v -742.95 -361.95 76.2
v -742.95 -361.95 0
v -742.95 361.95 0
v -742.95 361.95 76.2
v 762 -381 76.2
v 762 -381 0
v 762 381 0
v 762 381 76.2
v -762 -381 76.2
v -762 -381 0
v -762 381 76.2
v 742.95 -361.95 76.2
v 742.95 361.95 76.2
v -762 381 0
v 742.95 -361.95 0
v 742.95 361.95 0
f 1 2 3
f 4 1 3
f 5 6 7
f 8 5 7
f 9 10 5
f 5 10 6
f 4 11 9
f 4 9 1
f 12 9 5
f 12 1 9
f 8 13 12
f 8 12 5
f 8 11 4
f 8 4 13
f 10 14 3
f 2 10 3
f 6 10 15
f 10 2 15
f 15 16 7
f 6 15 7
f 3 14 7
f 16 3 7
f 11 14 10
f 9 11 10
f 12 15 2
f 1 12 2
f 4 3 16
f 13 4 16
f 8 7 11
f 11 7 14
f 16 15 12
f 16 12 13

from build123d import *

# Parameters (mm, degrees)
F0_W     = 19.05
F0_H     = 723.9
F1_DEPTH = 76.2


with BuildPart() as f1:
    # F0 (on Top) → F1 (new body)
    with BuildSketch(Plane.XY):
        Polygon((762, 381), (-762, 381), (-762, 361.95), (-742.95, 361.95), (742.95, 361.95), (762, 361.95), align=None)
        with Locations((-752.475, 0)):
            Rectangle(F0_W, F0_H)
        Polygon((-742.95, -361.95), (-762, -361.95), (-762, -381), (762, -381), (762, -361.95), (742.95, -361.95), align=None)
        with Locations((752.475, 0)):
            Rectangle(F0_W, F0_H)
    extrude(amount=F1_DEPTH)


solid = f1.part
